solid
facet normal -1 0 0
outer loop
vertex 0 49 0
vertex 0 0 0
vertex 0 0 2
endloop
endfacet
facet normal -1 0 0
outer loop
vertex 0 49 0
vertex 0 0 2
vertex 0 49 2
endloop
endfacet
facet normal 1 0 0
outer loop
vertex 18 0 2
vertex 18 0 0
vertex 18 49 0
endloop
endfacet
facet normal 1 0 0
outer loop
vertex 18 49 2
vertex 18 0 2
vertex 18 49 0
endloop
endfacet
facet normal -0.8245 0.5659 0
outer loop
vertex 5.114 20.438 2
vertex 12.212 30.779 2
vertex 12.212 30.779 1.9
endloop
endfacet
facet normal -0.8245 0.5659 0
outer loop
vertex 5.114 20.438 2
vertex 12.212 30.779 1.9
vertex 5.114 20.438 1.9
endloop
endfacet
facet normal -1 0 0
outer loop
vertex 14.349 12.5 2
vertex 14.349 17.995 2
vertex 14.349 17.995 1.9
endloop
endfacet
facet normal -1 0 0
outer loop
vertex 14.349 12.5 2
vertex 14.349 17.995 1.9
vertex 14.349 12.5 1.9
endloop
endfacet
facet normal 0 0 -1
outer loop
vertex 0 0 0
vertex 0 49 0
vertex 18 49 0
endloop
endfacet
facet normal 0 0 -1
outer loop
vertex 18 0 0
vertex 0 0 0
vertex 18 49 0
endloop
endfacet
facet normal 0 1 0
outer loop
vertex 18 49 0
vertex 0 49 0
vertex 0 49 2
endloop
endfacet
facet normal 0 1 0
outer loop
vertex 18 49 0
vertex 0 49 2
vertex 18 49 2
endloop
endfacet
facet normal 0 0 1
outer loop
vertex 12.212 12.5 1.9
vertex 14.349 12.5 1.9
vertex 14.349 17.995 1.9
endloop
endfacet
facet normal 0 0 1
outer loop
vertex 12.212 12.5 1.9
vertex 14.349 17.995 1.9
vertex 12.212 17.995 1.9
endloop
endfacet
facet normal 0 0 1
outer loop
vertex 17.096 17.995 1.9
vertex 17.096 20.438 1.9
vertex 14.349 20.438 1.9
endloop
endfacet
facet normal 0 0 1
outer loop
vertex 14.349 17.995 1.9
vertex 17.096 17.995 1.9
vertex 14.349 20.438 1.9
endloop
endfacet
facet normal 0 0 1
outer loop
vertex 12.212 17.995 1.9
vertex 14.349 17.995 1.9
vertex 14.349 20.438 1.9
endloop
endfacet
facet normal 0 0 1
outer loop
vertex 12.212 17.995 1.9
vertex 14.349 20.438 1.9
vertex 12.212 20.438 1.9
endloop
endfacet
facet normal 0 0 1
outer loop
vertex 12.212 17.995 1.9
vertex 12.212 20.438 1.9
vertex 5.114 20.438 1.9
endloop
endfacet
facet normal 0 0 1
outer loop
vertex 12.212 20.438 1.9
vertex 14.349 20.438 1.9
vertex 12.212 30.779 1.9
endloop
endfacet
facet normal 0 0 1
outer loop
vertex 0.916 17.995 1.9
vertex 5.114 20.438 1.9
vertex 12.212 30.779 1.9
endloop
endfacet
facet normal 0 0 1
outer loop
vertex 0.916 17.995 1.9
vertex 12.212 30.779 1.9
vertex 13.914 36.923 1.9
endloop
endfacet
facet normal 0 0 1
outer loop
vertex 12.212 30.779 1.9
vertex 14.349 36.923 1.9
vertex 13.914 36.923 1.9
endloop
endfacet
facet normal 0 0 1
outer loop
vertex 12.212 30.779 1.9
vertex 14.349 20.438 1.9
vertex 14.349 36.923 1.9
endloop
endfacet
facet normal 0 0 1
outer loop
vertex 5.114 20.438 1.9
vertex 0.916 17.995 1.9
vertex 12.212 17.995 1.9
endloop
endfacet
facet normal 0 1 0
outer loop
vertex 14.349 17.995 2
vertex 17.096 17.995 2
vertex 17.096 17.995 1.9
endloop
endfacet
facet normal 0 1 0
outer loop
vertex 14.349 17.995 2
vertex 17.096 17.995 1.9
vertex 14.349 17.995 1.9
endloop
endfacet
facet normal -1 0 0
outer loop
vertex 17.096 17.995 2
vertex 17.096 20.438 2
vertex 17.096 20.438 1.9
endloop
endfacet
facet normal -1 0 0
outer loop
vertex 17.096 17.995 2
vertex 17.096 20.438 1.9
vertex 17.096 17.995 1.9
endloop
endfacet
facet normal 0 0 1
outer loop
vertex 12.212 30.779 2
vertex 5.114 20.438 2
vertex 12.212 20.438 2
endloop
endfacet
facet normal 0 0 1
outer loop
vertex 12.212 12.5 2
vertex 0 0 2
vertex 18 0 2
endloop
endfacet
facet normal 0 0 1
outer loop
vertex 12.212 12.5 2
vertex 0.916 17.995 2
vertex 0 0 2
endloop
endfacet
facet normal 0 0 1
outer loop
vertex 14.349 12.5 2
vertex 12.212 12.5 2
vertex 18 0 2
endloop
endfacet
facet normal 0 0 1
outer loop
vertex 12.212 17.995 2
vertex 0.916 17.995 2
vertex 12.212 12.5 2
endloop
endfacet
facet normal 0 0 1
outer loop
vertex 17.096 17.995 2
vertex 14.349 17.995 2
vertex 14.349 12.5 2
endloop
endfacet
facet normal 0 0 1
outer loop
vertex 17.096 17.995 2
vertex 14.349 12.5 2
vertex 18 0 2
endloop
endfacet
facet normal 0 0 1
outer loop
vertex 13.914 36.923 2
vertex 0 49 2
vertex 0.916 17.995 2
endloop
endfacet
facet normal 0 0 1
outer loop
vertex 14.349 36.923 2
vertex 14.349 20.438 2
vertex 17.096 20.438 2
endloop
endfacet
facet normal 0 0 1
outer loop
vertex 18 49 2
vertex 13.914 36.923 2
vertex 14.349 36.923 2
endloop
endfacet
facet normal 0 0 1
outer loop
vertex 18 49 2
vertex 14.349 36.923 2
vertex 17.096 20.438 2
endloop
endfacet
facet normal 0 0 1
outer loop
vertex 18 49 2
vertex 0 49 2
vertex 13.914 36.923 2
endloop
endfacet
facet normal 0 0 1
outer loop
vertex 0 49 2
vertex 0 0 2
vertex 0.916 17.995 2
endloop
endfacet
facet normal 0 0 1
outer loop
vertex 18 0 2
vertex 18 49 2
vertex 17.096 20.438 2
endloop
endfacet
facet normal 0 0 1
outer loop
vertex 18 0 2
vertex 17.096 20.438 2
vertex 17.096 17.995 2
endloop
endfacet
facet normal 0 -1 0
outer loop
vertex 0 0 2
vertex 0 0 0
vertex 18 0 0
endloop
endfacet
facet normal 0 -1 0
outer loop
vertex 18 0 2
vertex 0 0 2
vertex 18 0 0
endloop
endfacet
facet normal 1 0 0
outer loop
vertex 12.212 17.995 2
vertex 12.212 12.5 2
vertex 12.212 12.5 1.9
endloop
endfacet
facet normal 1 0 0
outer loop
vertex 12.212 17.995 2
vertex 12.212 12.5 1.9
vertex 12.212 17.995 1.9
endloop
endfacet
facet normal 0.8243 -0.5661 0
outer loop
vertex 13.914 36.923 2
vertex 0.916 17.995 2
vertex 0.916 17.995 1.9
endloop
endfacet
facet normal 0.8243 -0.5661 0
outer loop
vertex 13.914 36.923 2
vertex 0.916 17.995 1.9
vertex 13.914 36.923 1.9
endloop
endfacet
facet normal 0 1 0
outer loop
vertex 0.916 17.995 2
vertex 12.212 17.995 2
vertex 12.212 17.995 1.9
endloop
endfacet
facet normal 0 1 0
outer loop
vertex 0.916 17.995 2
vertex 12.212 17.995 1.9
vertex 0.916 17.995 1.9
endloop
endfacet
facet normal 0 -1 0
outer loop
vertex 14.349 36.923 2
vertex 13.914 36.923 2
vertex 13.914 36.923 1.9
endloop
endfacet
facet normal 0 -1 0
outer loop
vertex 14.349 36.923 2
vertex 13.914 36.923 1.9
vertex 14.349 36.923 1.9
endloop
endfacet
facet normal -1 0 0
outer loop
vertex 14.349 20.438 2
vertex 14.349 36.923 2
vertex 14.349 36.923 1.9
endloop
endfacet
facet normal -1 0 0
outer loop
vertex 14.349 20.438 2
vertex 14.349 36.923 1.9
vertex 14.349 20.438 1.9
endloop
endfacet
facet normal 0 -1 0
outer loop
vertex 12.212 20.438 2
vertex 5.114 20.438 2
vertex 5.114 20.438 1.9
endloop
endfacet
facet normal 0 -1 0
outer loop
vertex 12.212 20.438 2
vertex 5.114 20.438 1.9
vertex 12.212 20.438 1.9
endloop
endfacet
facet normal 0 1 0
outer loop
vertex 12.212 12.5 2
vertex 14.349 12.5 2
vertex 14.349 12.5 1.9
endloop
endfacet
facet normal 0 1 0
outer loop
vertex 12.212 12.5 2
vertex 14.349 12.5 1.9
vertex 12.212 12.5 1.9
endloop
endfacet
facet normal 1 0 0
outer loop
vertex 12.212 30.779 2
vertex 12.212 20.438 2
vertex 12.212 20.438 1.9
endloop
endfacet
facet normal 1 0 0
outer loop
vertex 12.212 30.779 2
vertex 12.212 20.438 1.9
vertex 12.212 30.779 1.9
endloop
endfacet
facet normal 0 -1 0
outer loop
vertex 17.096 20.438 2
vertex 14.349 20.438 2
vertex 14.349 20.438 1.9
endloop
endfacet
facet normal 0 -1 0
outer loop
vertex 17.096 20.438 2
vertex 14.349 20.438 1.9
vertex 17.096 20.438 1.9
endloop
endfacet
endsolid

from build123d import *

# Parameters (mm, degrees)
SKETCH_1_W          = 18
SKETCH_1_H          = 49
EXTRUDE_1_DEPTH     = 2
CUT_EXTRUDE_1_DEPTH = 0.1


with BuildPart() as part:
    # ｽｹｯﾁ1 → ﾎﾞｽ - 押し出し1 (new body)
    with BuildSketch(Plane.XY):
        with Locations((9, 24.5)):
            Rectangle(SKETCH_1_W, SKETCH_1_H)
    extrude(amount=EXTRUDE_1_DEPTH)

    # ｽｹｯﾁ2 → ｶｯﾄ - 押し出し1 (cut)
    with BuildSketch(Plane.XY.offset(2)):
        Polygon((13.914475661, 36.923076923), (14.348557692, 36.923076923), (14.348557692, 20.4375), (17.096153846, 20.4375), (17.096153846, 17.995192308), (14.348557692, 17.995192308), (14.348557692, 12.5), (12.211538462, 12.5), (12.211538462, 17.995192308), (0.915865385, 17.995192308), align=None)
        Polygon((12.211538462, 20.4375), (12.211538462, 30.779146635), (5.113581731, 20.4375), align=None, mode=Mode.SUBTRACT)
    extrude(amount=-CUT_EXTRUDE_1_DEPTH, mode=Mode.SUBTRACT)


solid = part.part
